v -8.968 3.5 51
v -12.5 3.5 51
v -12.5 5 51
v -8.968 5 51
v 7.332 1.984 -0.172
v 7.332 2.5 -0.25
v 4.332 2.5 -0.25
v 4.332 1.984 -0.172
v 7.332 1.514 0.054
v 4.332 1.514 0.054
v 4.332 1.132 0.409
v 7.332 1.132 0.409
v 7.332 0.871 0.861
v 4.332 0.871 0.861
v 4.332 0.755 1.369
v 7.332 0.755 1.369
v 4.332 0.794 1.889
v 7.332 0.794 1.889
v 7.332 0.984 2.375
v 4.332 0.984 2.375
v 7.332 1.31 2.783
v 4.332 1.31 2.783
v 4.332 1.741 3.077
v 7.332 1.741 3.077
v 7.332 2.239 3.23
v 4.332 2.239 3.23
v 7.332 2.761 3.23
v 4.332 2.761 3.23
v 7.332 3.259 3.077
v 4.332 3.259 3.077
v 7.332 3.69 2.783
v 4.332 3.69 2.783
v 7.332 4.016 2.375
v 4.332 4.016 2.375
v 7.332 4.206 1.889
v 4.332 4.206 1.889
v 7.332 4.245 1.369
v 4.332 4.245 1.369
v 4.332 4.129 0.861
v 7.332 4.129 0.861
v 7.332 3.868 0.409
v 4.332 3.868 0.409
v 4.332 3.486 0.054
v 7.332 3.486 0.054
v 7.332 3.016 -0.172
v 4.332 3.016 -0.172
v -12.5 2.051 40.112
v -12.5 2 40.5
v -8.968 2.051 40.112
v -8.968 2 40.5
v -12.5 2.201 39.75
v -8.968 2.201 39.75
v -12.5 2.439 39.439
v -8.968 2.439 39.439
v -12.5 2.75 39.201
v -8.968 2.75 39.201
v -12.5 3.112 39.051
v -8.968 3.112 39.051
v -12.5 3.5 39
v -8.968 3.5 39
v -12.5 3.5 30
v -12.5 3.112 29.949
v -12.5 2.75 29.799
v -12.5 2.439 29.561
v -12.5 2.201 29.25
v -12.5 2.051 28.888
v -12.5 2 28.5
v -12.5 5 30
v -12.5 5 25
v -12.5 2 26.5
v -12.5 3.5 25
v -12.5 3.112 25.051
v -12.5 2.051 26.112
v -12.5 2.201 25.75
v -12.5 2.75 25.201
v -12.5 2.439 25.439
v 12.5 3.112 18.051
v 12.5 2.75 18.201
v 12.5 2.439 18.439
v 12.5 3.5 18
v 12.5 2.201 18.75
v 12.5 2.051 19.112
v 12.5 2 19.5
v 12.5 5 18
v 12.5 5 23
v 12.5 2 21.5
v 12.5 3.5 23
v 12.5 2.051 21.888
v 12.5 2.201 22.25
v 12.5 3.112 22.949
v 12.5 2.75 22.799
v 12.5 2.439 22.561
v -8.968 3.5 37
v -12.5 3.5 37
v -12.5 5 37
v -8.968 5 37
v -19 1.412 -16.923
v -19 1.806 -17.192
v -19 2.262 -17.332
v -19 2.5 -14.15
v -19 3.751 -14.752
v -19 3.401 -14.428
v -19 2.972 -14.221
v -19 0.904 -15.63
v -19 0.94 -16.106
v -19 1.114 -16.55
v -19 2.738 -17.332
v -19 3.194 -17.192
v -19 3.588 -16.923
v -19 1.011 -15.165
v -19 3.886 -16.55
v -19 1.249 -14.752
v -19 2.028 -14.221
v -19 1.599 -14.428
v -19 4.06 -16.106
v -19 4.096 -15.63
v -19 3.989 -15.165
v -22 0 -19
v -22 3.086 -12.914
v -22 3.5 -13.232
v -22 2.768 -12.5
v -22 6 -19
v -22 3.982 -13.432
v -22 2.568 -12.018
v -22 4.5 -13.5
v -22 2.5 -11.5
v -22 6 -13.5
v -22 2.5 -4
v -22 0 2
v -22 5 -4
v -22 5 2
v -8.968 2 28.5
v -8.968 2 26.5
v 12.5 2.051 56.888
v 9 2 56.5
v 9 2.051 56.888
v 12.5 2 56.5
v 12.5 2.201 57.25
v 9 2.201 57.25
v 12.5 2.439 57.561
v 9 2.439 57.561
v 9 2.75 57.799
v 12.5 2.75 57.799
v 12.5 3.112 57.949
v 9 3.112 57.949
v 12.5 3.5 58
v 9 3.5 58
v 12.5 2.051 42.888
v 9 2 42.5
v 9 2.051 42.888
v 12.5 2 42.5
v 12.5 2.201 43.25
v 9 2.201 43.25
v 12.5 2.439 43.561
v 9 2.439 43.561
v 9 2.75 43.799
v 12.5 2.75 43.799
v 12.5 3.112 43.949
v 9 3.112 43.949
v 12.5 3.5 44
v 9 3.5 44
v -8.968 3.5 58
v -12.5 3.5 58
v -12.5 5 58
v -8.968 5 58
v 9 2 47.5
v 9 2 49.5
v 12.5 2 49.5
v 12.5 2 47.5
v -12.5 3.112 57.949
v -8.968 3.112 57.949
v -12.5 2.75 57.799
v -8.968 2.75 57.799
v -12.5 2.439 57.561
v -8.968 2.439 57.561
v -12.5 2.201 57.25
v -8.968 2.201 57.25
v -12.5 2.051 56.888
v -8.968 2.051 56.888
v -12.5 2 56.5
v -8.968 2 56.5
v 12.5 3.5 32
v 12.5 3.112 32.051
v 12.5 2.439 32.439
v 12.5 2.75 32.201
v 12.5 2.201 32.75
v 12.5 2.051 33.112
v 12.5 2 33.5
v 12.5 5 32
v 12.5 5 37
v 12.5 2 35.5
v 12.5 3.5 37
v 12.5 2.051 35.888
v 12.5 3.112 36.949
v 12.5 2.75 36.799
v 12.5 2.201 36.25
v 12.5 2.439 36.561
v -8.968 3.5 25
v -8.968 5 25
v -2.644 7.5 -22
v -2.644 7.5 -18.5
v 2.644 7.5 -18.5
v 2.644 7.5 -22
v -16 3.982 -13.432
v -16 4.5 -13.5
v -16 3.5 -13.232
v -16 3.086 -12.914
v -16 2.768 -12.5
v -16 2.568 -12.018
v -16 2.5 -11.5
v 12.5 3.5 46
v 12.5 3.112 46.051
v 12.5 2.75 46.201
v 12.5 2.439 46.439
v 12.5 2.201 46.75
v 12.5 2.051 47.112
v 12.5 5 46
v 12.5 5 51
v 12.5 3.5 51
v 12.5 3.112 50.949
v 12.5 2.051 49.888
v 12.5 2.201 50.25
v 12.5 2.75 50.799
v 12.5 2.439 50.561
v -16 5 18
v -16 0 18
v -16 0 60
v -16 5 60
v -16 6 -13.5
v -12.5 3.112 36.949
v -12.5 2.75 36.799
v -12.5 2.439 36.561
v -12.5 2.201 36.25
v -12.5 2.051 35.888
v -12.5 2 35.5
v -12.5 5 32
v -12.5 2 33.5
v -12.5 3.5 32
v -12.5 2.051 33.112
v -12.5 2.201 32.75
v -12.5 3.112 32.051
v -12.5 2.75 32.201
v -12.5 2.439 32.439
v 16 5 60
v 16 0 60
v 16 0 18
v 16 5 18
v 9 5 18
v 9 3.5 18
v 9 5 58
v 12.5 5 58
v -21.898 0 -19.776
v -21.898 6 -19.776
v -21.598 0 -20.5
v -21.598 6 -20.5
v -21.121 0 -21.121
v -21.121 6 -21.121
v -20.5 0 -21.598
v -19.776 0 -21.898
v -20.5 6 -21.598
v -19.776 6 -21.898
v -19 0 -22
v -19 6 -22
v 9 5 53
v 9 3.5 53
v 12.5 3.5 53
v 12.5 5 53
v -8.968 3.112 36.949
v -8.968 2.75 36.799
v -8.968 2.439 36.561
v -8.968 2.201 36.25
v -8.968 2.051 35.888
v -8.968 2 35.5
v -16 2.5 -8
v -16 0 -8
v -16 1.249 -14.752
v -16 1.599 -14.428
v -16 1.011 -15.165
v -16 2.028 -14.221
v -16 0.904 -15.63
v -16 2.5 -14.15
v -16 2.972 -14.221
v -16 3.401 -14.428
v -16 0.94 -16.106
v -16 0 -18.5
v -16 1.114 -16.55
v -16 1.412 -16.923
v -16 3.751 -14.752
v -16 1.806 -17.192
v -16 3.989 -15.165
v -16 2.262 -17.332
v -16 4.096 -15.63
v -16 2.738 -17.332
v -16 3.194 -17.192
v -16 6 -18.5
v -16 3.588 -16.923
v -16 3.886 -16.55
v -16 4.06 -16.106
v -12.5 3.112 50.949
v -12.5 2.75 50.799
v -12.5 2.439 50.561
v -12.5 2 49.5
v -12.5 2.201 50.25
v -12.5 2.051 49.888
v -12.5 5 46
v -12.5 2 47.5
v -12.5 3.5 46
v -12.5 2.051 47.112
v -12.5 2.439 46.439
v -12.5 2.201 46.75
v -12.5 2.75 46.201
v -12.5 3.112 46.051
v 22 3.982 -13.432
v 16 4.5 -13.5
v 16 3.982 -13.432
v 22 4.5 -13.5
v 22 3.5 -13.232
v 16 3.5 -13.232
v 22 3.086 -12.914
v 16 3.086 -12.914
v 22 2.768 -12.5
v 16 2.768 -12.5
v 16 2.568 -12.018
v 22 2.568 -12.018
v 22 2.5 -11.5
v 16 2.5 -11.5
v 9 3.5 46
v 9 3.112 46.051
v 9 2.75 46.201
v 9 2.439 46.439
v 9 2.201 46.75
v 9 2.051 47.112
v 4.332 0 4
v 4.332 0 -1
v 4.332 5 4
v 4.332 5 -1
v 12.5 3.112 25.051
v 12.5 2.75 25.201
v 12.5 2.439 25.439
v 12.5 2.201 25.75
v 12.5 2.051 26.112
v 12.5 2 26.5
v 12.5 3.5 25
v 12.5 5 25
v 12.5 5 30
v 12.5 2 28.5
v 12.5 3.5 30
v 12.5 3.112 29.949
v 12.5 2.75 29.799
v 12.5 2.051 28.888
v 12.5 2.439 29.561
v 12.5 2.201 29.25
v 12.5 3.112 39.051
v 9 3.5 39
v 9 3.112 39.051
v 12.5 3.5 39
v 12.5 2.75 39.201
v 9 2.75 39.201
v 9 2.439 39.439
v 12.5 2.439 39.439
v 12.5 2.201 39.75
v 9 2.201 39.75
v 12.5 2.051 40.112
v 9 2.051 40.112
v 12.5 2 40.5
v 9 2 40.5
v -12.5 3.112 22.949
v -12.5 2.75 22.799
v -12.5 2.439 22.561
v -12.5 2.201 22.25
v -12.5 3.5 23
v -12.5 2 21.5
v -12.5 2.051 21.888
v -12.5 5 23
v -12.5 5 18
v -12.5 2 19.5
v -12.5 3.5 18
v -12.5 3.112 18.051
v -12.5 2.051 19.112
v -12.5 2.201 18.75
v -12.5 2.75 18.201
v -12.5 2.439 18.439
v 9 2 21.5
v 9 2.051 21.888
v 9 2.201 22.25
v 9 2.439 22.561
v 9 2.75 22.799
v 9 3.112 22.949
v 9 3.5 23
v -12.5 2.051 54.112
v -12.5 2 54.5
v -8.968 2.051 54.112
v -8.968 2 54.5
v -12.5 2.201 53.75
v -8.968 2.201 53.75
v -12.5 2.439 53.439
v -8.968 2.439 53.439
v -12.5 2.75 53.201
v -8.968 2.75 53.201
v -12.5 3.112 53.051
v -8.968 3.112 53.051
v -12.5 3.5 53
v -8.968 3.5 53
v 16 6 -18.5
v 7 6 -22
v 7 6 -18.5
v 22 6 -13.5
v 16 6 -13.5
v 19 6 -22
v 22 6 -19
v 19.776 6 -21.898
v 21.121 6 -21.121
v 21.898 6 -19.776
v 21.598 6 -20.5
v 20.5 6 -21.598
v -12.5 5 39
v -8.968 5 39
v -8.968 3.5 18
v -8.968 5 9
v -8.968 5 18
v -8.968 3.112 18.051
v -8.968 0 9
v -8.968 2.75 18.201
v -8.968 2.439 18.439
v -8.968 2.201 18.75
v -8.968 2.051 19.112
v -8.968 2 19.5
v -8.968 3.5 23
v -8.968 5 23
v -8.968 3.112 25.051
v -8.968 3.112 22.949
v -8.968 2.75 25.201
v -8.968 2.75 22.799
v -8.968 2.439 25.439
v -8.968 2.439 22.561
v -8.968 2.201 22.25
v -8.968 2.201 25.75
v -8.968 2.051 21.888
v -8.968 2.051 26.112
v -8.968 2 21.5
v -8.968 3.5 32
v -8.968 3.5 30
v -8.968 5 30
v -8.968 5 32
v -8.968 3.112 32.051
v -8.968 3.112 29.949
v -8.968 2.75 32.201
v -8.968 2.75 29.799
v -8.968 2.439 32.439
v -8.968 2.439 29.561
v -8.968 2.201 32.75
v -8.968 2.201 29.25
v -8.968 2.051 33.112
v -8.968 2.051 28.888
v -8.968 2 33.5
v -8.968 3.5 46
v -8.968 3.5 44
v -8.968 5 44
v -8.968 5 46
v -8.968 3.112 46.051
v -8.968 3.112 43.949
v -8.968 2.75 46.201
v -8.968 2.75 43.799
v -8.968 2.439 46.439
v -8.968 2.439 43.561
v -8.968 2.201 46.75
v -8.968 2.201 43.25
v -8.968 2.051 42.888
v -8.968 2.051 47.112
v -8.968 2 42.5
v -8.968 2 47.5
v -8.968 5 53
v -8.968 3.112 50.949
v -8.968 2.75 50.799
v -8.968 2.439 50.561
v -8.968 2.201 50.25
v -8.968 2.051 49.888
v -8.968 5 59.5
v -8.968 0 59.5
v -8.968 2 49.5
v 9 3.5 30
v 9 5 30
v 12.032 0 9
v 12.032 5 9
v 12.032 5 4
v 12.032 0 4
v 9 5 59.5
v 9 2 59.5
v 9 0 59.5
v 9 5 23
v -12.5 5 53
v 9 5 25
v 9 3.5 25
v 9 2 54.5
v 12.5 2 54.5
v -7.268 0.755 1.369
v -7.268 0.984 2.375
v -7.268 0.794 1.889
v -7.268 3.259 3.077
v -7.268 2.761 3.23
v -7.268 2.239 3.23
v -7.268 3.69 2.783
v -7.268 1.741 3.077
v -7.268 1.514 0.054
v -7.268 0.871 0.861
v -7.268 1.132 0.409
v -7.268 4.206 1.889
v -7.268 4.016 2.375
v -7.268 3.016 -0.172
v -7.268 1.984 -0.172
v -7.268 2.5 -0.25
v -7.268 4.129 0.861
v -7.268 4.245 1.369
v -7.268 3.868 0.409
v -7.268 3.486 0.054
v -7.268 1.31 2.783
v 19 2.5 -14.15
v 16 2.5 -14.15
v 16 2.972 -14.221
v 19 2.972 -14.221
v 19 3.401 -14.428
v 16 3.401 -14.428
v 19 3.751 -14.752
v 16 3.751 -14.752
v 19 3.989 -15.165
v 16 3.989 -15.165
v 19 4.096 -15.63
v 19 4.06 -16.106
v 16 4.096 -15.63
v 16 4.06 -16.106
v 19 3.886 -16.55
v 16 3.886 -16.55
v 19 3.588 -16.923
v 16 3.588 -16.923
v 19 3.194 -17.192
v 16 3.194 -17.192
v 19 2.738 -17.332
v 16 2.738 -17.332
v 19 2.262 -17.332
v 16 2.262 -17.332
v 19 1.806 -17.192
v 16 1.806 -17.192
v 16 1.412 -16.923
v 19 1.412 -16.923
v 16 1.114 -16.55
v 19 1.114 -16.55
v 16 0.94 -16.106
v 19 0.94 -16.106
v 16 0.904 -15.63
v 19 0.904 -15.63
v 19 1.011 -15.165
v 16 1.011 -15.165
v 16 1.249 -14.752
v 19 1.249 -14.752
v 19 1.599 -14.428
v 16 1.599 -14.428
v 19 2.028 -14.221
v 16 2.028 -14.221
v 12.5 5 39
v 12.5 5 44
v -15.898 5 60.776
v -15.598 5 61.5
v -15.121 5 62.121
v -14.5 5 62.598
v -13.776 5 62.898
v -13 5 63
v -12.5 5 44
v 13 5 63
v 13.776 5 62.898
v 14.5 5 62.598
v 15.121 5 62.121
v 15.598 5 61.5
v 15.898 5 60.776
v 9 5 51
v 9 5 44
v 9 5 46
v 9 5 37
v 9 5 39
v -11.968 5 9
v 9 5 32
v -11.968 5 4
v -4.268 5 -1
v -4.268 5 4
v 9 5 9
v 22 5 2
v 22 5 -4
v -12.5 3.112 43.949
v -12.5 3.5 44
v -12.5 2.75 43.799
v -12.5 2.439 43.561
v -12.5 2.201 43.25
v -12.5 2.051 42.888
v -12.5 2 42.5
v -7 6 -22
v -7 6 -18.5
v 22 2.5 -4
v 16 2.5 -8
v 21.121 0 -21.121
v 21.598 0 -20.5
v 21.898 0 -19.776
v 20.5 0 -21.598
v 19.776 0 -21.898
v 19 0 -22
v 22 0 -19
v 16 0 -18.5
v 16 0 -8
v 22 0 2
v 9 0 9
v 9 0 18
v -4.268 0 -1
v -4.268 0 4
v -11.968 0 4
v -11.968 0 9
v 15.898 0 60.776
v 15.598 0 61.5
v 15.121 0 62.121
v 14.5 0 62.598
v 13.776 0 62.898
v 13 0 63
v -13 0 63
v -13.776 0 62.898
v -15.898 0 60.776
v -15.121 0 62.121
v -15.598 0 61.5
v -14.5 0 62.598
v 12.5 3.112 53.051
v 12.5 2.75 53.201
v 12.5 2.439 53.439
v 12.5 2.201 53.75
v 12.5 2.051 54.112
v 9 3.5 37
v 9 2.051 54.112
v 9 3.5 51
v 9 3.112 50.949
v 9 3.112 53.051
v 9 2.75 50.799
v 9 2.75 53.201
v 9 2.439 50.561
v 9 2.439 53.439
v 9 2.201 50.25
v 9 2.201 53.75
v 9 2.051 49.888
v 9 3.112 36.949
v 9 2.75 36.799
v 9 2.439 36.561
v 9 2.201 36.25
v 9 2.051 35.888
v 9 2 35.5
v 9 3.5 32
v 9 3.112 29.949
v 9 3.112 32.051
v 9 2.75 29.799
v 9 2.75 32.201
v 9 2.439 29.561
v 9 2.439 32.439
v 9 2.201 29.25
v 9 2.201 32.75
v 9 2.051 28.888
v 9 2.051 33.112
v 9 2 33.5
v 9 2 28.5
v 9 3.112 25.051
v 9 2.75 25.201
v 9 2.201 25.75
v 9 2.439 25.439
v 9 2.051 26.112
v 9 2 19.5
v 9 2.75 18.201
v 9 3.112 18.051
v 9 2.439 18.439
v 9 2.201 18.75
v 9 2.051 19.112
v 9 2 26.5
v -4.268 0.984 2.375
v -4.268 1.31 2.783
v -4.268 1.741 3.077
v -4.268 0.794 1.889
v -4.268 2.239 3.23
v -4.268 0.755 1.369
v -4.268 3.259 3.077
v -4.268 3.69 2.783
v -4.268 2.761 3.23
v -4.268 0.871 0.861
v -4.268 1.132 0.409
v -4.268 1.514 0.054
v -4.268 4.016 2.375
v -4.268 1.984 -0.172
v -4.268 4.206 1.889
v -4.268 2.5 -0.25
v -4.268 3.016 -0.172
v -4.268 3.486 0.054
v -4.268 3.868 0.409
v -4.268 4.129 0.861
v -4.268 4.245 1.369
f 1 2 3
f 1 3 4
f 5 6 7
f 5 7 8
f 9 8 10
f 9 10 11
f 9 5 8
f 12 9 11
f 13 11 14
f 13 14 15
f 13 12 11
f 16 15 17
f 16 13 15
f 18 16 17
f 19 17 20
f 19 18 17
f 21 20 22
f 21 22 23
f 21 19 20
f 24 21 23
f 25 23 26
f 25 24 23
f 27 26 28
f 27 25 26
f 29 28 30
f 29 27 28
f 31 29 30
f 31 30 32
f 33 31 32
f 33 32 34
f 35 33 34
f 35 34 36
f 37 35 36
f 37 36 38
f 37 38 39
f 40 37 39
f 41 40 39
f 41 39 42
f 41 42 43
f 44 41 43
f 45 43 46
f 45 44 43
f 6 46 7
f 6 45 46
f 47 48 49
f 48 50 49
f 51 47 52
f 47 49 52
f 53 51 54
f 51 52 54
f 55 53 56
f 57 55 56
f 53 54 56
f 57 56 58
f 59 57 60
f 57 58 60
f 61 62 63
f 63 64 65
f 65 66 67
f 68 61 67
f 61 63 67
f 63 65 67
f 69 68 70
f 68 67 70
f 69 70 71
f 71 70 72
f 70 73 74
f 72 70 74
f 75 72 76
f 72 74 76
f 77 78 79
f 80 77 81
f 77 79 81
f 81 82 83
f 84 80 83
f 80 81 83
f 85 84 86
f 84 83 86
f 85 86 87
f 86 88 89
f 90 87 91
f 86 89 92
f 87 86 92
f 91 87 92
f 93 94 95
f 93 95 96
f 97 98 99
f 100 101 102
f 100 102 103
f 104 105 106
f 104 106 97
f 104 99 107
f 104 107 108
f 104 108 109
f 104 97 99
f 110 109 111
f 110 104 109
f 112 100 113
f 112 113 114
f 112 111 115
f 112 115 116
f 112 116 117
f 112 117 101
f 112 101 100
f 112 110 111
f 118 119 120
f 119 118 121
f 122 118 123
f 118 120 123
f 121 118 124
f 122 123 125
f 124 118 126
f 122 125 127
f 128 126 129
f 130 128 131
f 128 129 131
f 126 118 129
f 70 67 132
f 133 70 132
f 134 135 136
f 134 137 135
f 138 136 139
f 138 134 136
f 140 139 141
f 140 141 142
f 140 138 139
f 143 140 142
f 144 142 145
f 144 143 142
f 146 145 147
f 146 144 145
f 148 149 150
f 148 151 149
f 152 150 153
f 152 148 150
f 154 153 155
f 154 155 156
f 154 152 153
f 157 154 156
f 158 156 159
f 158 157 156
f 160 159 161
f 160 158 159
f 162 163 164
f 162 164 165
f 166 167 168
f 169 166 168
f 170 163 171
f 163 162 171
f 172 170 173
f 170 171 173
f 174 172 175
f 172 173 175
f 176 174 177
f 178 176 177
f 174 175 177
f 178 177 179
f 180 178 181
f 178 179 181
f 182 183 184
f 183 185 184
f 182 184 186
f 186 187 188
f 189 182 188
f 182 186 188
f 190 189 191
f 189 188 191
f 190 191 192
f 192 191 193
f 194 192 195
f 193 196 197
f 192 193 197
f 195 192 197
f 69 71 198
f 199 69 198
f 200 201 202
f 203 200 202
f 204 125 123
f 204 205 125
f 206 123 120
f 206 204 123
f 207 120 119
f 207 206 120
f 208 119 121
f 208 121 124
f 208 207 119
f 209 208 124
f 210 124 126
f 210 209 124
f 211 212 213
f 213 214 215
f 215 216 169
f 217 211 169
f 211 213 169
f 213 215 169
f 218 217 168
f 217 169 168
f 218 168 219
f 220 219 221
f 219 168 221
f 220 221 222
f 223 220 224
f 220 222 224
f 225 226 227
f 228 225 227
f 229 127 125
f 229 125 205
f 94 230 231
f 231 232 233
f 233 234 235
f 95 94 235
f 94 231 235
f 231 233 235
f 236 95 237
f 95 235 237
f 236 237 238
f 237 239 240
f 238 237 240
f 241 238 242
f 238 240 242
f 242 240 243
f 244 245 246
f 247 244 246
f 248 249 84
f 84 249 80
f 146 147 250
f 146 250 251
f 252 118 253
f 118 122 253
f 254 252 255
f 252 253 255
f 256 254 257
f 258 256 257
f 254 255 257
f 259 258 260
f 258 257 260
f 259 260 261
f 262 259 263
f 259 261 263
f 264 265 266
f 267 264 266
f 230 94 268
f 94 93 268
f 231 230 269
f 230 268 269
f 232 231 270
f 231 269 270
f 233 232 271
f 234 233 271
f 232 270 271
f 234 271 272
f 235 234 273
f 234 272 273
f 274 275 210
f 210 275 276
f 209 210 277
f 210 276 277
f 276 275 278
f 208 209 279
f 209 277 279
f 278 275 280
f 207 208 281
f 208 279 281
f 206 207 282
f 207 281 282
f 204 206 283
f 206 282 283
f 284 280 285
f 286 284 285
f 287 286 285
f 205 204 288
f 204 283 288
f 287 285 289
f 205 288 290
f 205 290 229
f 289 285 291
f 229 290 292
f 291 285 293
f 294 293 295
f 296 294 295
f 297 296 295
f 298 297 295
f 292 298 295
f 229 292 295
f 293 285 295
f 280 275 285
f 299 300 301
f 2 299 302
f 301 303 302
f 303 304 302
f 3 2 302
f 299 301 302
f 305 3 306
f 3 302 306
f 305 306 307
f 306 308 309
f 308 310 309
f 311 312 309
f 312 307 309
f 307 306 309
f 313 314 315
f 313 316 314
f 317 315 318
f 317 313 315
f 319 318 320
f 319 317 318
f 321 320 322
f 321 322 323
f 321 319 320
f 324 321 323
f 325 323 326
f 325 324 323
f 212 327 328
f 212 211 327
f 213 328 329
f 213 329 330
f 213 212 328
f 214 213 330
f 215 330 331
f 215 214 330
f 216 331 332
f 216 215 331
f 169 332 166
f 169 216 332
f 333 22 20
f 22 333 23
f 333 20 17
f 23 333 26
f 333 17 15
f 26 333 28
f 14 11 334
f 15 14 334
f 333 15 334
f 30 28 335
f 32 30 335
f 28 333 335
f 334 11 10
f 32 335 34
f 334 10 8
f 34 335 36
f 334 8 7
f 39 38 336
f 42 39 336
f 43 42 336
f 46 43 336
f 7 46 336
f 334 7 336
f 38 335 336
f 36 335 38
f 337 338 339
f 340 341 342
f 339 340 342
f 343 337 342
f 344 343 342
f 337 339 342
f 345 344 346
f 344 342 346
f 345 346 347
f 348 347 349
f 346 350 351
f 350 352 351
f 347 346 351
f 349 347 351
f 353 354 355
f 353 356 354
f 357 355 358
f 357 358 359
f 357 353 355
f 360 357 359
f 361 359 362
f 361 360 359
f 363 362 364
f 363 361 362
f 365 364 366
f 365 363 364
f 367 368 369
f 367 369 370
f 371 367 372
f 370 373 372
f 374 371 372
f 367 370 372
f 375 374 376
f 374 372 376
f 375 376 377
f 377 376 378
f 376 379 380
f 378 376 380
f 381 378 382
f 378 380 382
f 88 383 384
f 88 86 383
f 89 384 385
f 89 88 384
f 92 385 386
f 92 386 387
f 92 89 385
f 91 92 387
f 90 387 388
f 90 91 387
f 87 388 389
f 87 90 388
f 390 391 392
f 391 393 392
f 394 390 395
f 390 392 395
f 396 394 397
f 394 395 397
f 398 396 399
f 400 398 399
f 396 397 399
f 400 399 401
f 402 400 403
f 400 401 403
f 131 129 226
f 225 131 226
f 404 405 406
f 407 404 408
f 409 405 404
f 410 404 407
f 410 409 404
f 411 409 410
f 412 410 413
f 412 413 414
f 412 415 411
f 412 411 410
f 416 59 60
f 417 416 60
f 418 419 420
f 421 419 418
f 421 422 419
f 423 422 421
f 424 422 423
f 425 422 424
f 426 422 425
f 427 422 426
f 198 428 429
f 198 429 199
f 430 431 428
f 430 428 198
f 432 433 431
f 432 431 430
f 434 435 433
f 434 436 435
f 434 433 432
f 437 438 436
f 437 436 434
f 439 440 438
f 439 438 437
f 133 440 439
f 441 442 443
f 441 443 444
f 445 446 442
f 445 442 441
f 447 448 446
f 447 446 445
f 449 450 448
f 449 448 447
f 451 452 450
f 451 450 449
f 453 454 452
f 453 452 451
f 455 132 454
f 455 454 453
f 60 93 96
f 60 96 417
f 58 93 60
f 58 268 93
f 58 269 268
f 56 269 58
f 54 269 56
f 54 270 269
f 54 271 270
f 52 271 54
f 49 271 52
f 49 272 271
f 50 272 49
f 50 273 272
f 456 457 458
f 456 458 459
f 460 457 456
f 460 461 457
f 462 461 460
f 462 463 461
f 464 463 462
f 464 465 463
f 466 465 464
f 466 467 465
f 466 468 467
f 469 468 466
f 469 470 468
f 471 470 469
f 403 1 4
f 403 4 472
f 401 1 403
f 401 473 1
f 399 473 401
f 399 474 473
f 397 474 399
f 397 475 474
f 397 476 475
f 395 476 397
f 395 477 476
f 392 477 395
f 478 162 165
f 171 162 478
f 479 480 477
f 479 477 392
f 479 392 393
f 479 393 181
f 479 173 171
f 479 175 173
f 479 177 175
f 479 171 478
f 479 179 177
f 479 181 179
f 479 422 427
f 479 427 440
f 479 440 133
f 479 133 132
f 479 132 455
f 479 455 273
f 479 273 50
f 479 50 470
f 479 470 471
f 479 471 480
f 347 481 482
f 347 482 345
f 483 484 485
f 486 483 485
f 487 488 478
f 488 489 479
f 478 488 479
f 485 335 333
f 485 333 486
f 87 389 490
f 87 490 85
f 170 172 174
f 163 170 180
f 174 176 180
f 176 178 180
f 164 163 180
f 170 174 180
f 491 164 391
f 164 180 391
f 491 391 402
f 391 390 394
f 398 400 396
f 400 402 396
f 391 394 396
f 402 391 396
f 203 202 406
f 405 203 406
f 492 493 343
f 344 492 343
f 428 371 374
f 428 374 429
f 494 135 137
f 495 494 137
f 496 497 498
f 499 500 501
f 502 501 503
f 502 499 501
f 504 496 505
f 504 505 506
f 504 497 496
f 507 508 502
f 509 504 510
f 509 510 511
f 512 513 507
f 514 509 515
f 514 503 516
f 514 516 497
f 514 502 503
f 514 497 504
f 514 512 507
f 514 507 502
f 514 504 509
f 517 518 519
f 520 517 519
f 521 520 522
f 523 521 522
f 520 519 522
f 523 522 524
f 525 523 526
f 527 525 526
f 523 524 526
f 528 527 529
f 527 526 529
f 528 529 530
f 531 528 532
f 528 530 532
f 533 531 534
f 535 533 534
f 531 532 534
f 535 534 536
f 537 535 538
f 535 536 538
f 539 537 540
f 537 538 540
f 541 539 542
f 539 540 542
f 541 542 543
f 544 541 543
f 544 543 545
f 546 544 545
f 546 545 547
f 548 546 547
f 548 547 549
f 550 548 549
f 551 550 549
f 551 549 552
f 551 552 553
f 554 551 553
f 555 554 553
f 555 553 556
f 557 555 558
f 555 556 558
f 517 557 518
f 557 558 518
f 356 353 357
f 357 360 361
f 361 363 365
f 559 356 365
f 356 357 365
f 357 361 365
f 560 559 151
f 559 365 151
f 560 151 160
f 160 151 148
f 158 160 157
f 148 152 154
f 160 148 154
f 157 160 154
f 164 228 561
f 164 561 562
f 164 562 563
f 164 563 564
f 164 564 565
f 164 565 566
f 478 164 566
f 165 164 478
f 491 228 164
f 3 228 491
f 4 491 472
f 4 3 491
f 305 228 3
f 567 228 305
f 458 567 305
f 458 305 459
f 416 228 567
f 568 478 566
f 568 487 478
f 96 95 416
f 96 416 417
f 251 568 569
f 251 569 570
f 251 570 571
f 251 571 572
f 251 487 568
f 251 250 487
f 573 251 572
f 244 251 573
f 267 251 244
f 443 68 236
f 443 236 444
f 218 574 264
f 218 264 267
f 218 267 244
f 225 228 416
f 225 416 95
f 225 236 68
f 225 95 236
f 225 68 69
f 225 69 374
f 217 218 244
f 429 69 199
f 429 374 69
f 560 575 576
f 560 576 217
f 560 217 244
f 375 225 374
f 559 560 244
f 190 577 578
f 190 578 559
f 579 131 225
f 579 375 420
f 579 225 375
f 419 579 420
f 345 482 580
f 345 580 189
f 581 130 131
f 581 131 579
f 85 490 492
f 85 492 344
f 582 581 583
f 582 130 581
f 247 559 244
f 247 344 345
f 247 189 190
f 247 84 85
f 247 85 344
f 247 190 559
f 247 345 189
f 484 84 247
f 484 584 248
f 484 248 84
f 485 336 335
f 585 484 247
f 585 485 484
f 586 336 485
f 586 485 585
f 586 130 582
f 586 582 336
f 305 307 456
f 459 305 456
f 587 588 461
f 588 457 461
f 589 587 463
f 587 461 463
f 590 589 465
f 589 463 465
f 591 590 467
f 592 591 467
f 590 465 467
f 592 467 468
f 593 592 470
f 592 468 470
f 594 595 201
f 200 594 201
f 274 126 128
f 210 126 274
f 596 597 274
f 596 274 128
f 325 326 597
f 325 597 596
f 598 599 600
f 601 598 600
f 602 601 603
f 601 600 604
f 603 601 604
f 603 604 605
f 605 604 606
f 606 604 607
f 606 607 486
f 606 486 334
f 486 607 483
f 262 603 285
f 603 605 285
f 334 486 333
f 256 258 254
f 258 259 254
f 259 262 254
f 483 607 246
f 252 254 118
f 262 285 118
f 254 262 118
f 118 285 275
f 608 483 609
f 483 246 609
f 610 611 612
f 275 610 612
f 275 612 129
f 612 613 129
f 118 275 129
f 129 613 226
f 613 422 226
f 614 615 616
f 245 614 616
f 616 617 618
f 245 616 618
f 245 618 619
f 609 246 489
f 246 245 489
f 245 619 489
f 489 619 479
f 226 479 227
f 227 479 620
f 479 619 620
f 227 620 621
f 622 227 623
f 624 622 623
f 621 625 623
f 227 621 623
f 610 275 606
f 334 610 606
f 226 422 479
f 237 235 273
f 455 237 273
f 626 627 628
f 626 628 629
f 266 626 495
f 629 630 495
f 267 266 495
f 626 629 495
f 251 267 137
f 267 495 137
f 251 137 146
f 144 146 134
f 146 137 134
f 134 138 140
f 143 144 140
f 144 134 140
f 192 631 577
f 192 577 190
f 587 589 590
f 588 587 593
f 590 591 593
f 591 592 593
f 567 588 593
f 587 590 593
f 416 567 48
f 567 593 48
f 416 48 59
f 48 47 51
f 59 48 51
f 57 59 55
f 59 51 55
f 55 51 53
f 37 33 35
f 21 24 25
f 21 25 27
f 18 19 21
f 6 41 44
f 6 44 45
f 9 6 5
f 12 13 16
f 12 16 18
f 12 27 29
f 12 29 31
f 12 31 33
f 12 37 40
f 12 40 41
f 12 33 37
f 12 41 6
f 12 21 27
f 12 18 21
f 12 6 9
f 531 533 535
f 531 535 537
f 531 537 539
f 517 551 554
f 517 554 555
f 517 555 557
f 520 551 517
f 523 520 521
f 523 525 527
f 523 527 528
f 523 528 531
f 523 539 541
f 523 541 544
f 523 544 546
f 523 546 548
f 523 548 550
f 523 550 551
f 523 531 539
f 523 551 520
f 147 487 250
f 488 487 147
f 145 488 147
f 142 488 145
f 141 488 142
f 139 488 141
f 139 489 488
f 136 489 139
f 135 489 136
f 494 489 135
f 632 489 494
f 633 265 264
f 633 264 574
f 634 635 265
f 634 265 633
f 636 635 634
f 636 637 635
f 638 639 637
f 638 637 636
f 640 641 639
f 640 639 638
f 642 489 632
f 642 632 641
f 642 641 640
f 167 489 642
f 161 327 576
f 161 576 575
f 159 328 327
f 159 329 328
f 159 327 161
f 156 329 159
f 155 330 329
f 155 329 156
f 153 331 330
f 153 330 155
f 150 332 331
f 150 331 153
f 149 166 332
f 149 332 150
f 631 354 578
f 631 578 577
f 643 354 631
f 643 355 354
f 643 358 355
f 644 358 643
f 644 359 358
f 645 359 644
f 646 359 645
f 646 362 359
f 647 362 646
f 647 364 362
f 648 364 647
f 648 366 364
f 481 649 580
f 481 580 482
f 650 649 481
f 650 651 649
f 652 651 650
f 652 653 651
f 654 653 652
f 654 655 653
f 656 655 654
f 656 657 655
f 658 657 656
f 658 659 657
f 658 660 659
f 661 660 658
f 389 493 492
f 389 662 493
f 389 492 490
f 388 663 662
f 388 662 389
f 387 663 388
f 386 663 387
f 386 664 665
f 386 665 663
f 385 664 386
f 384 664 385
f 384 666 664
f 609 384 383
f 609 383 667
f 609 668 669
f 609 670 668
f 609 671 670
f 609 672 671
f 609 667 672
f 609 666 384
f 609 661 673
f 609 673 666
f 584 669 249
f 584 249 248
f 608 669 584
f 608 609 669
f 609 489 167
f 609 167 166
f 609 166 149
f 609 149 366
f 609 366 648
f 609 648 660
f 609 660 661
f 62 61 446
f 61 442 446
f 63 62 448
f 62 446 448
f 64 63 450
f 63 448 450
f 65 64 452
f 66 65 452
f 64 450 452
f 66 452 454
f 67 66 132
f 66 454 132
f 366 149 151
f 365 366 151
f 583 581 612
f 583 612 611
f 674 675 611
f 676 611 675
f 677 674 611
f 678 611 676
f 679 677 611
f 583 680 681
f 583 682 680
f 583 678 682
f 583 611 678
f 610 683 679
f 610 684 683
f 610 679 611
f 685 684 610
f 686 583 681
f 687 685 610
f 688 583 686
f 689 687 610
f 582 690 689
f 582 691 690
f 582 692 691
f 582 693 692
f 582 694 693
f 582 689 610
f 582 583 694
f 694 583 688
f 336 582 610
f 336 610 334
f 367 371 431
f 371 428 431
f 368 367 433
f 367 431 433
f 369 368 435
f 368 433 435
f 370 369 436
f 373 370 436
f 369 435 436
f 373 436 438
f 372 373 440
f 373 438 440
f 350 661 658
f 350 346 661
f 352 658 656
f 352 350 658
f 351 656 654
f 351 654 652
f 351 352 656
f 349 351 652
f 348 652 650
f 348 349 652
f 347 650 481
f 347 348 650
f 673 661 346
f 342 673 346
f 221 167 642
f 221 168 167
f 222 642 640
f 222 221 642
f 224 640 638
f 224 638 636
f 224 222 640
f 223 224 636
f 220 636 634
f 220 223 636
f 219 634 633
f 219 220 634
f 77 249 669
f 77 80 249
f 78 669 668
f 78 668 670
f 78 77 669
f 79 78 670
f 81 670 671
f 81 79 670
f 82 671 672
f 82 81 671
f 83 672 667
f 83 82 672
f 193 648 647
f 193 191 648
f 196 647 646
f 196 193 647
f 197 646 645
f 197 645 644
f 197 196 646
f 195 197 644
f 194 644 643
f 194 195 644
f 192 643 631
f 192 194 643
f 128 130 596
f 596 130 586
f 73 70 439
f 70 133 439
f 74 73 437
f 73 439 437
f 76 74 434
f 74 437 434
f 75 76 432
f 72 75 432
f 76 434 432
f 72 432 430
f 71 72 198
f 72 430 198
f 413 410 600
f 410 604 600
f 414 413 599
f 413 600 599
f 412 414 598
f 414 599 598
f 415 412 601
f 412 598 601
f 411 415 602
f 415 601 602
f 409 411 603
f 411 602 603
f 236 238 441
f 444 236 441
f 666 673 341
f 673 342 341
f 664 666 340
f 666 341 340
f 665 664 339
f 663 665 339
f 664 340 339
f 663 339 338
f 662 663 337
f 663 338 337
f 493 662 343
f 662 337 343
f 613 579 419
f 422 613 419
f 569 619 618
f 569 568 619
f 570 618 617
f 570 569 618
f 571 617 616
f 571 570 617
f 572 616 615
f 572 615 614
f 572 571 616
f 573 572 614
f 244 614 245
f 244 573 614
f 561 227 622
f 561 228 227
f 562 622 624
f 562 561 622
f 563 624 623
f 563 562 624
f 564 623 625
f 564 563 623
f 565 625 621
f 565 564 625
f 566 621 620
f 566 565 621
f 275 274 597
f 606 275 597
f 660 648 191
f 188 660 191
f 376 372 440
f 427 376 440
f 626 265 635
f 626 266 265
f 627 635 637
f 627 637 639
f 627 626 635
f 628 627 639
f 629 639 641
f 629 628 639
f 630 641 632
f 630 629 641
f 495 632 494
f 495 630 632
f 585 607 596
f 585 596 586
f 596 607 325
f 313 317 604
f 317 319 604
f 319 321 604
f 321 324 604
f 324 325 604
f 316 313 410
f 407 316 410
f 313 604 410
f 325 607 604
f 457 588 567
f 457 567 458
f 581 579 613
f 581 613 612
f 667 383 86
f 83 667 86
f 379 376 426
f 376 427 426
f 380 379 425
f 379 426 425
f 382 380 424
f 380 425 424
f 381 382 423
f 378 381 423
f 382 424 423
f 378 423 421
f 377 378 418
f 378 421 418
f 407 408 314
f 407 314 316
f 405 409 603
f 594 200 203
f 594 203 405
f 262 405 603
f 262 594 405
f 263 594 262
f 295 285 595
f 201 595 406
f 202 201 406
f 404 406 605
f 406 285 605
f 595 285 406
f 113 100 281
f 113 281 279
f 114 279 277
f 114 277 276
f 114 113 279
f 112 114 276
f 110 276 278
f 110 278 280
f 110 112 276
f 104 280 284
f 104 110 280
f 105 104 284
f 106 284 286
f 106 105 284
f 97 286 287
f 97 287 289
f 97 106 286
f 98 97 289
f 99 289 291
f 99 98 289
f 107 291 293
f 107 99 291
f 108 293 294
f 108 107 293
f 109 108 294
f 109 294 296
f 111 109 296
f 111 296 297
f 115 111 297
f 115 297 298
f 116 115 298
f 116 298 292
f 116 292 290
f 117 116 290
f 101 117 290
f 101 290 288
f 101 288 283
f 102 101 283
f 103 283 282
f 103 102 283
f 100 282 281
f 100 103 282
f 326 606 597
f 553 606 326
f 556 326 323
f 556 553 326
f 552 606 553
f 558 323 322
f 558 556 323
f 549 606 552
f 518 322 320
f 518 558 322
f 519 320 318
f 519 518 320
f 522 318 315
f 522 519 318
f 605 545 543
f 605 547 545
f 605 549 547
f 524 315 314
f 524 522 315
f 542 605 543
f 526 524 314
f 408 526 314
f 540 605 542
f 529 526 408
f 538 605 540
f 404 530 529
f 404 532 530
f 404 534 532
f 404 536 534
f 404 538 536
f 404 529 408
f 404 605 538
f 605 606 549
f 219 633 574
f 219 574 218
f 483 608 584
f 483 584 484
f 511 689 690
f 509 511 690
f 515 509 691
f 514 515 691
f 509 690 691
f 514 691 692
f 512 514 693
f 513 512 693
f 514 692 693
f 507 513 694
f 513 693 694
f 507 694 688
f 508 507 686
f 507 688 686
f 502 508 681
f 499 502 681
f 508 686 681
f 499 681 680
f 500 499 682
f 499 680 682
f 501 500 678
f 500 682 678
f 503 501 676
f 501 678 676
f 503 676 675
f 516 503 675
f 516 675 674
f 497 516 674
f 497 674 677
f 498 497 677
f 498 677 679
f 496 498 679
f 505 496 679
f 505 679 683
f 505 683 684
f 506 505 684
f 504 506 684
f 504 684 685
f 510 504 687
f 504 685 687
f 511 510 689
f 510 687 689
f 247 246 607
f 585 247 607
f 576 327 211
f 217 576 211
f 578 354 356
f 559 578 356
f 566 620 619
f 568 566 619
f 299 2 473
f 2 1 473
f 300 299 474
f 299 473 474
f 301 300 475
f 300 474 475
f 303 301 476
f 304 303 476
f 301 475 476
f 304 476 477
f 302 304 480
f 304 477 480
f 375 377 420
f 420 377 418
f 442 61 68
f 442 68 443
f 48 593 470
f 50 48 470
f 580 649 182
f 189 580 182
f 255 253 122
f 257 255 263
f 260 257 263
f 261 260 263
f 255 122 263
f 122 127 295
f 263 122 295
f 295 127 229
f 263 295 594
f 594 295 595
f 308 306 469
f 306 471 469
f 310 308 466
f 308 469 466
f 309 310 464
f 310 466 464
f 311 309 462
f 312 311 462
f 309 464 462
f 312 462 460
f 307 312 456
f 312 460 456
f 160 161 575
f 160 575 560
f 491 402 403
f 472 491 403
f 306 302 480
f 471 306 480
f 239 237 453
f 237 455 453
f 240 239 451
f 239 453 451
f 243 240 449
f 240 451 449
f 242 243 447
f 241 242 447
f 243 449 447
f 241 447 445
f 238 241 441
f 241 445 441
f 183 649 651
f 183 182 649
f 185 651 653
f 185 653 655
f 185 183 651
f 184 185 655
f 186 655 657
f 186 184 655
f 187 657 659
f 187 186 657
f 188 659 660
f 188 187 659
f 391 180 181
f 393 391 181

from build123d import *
from OCP.BRepFilletAPI import BRepFilletAPI_MakeChamfer

# Parameters (mm, degrees)
SKETCH1_W                = 44
SKETCH1_H                = 22
BOSS_EXTRUDE1_DEPTH      = 5
SKETCH2_W                = 3.531949687
SKETCH2_H                = 41.5
SKETCH2_W_2              = 3.5
BOSS_EXTRUDE2_DEPTH      = 2
SKETCH3_W                = 44
SKETCH3_H                = 9.5
CUT_EXTRUDE1_DEPTH       = 2.5
SKETCH4_W                = 17.968050313
SKETCH4_H                = 14
CUT_EXTRUDE2_DEPTH       = 5
SKETCH5_W                = 24
SKETCH5_H                = 5
CUT_EXTRUDE3_DEPTH       = 5
SKETCH6_W                = 8.6
SKETCH6_H                = 5
CUT_EXTRUDE4_DEPTH       = 5
SKETCH7_W                = 14
SKETCH7_H                = 2
BOSS_EXTRUDE3_DEPTH      = 1.5
CHAMFER1_SIZE            = 1.5
CHAMFER1_SIZE_2          = 4.356316317
SKETCH8_W                = 32
SKETCH8_H                = 10
CUT_EXTRUDE5_DEPTH       = 5
FILLET3_R                = 3
SKETCH9_R                = 1.75
CUT_EXTRUDE6_DEPTH       = 3
CUT_EXTRUDE7_START       = -3
SKETCH10_R               = 1.75
CUT_EXTRUDE7_DEPTH       = 3
SKETCH11_R               = 1.6
CUT_EXTRUDE8_DEPTH       = 3
CUT_EXTRUDE9_START       = -3
SKETCH12_R               = 1.6
CUT_EXTRUDE9_DEPTH       = 3
SKETCH13_W               = 3.531949687
SKETCH13_H               = 2
BOSS_EXTRUDE5_DEPTH      = 3
FILLET4_R                = 1.5
BOSS_EXTRUDE6_DEPTH      = 2
BOSS_EXTRUDE6_DEPTH_BACK = 2
SKETCH15_W               = 6
SKETCH15_H               = 1
BOSS_EXTRUDE7_DEPTH      = 4.5
FILLET5_R                = 2
FILLET6_R                = 3
CUT_EXTRUDE10_DEPTH      = 14.5
CUT_EXTRUDE10_DEPTH_BACK = 14.5
SKETCH16_W               = 32
SKETCH16_H               = 0.5


with BuildPart() as part:
    # Sketch1 → Boss-Extrude1 (new body)
    with BuildSketch(Plane(origin=(0, 0, 0), x_dir=(1, 0, 0), z_dir=(0, 1, 0))):
        with Locations((0, 9)):
            Rectangle(SKETCH1_W, SKETCH1_H)
        Polygon((-16, -18), (16, -18), (22, -2), (-22, -2), align=None)
        Polygon((-12.5, -18), (-16, -18), (-16, -63), (16, -63), (16, -18), (12.5, -18), (12.5, -59.5), (-12.5, -59.5), align=None)
    extrude(amount=BOSS_EXTRUDE1_DEPTH)

    # Sketch2 → Boss-Extrude2 (add)
    with BuildSketch(Plane.XZ):
        with Locations((-10.734025156, 38.75)):
            Rectangle(SKETCH2_W, SKETCH2_H)
        with Locations((10.75, 38.75)):
            Rectangle(SKETCH2_W_2, SKETCH2_H)
    extrude(amount=-BOSS_EXTRUDE2_DEPTH)

    # Sketch3 → Cut-Extrude1 (cut)
    with BuildSketch(Plane(origin=(0, 5, 0), x_dir=(1, 0, 0), z_dir=(0, 1, 0))):
        with Locations((0, 8.75)):
            Rectangle(SKETCH3_W, SKETCH3_H)
    extrude(amount=-CUT_EXTRUDE1_DEPTH, mode=Mode.SUBTRACT)

    # Sketch4 → Cut-Extrude2 (cut)
    with BuildSketch(Plane(origin=(0, 5, 0), x_dir=(1, 0, 0), z_dir=(0, 1, 0))):
        with Locations((0.015974843, -11)):
            Rectangle(SKETCH4_W, SKETCH4_H)
    extrude(amount=-CUT_EXTRUDE2_DEPTH, mode=Mode.SUBTRACT)

    # Sketch5 → Cut-Extrude3 (cut)
    with BuildSketch(Plane(origin=(0, 5, 0), x_dir=(1, 0, 0), z_dir=(0, 1, 0))):
        with Locations((0.031949687, -6.5)):
            Rectangle(SKETCH5_W, SKETCH5_H)
    extrude(amount=-CUT_EXTRUDE3_DEPTH, mode=Mode.SUBTRACT)

    # Sketch6 → Cut-Extrude4 (cut)
    with BuildSketch(Plane(origin=(0, 5, 0), x_dir=(1, 0, 0), z_dir=(0, 1, 0))):
        with Locations((0.031949687, -1.5)):
            Rectangle(SKETCH6_W, SKETCH6_H)
    extrude(amount=-CUT_EXTRUDE4_DEPTH, mode=Mode.SUBTRACT)

    # Sketch7 → Boss-Extrude3 (add)
    with BuildSketch(Plane(origin=(0, 5, 0), x_dir=(1, 0, 0), z_dir=(0, 1, 0))):
        with Locations((0, 19)):
            Rectangle(SKETCH7_W, SKETCH7_H)
    extrude(amount=BOSS_EXTRUDE3_DEPTH)

    # Chamfer1
    chamfer1_edges_1 = [part.edges().sort_by_distance(p)[0] for p in [
        (7, 6.5, -19),
    ]]
    chamfer1_side_1 = [part.faces().sort_by_distance(p)[0] for p in [
        (7, 6.47, -19),
    ]]
    chamfer1_edges_2 = [part.edges().sort_by_distance(p)[0] for p in [
        (-7, 6.5, -19),
    ]]
    chamfer1_side_2 = [part.faces().sort_by_distance(p)[0] for p in [
        (-7, 6.47, -19),
    ]]
    chamfer1 = BRepFilletAPI_MakeChamfer(part.part.solid().wrapped)
    for e in chamfer1_edges_1:
        chamfer1.Add(CHAMFER1_SIZE - 0.0001, CHAMFER1_SIZE_2 - 0.0001, e.wrapped, chamfer1_side_1[0].wrapped)
    for e in chamfer1_edges_2:
        chamfer1.Add(CHAMFER1_SIZE - 0.0001, CHAMFER1_SIZE_2 - 0.0001, e.wrapped, chamfer1_side_2[0].wrapped)
    add(Compound.cast(chamfer1.Shape()), mode=Mode.REPLACE)  # a hair under: the kernel refuses the full size

    # Sketch8 → Cut-Extrude5 (cut)
    with BuildSketch(Plane(origin=(0, 5, 0), x_dir=(1, 0, 0), z_dir=(0, 1, 0))):
        with Locations((0, 13)):
            Rectangle(SKETCH8_W, SKETCH8_H)
    extrude(amount=-CUT_EXTRUDE5_DEPTH, mode=Mode.SUBTRACT)

    # Fillet3
    fillet3_edges = [part.edges().sort_by_distance(p)[0] for p in [
        (16, 2.5, 63),
        (-16, 2.5, 63),
    ]]
    fillet(fillet3_edges, radius=FILLET3_R)

    # Sketch9 → Cut-Extrude6 (cut)
    with BuildSketch(Plane(origin=(-4.268050313, 0, 0), x_dir=(0, 0, -1), z_dir=(1, 0, 0))):
        with Locations((-1.5, 2.5)):
            Circle(SKETCH9_R)
    extrude(amount=-CUT_EXTRUDE6_DEPTH, mode=Mode.SUBTRACT)

    # Sketch10 → Cut-Extrude7 (cut)
    with BuildSketch(Plane.ZY.offset(-4.331949687).offset(CUT_EXTRUDE7_START)):
        with Locations(Location((1.5, 2.5, 0), (0, 0, 180))):
            Circle(SKETCH10_R)
    extrude(amount=CUT_EXTRUDE7_DEPTH, mode=Mode.SUBTRACT)

    # Sketch11 → Cut-Extrude8 (cut)
    with BuildSketch(Plane.ZY.offset(-16)):
        with Locations((-15.75, 2.5)):
            Circle(SKETCH11_R)
    extrude(amount=-CUT_EXTRUDE8_DEPTH, mode=Mode.SUBTRACT)

    # Sketch12 → Cut-Extrude9 (cut)
    with BuildSketch(Plane(origin=(-16, 0, 0), x_dir=(0, 0, -1), z_dir=(1, 0, 0)).offset(CUT_EXTRUDE9_START)):
        with Locations(Location((15.75, 2.5, 0), (0, 0, 180))):
            Circle(SKETCH12_R)
    extrude(amount=CUT_EXTRUDE9_DEPTH, mode=Mode.SUBTRACT)

    # Sketch13 → Boss-Extrude5 (add)
    with BuildSketch(Plane(origin=(0, 2, 0), x_dir=(1, 0, 0), z_dir=(0, 1, 0))):
        with Locations((-10.734025156, -24)):
            Rectangle(SKETCH13_W, SKETCH13_H)
        with Locations((10.765974844, -24)):
            Rectangle(SKETCH13_W, SKETCH13_H)
        with Locations((10.765974844, -31)):
            Rectangle(SKETCH13_W, SKETCH13_H)
        with Locations((10.765974844, -38)):
            Rectangle(SKETCH13_W, SKETCH13_H)
        with Locations((10.765974844, -45)):
            Rectangle(SKETCH13_W, SKETCH13_H)
        with Locations((10.765974844, -52)):
            Rectangle(SKETCH13_W, SKETCH13_H)
        with Locations((10.765974844, -59)):
            Rectangle(SKETCH13_W, SKETCH13_H)
        with Locations((-10.734025156, -31)):
            Rectangle(SKETCH13_W, SKETCH13_H)
        with Locations((-10.734025156, -38)):
            Rectangle(SKETCH13_W, SKETCH13_H)
        with Locations((-10.734025156, -45)):
            Rectangle(SKETCH13_W, SKETCH13_H)
        with Locations((-10.734025156, -52)):
            Rectangle(SKETCH13_W, SKETCH13_H)
        with Locations((-10.734025156, -59)):
            Rectangle(SKETCH13_W, SKETCH13_H)
    extrude(amount=BOSS_EXTRUDE5_DEPTH)

    # Fillet4
    fillet4_edges = [part.edges().sort_by_distance(p)[0] for p in [
        (-10.734025157, 2, 23),
        (-10.734025157, 2, 25),
        (10.75, 2, 23),
        (10.75, 2, 25),
        (10.75, 2, 30),
        (10.75, 2, 32),
        (10.75, 2, 37),
        (10.75, 2, 39),
        (10.75, 2, 44),
        (10.75, 2, 46),
        (10.75, 2, 51),
        (10.75, 2, 53),
        (10.75, 2, 58),
        (-10.734025157, 2, 30),
        (-10.734025157, 2, 32),
        (-10.734025157, 2, 37),
        (-10.734025157, 2, 39),
        (-10.734025157, 2, 44),
        (-10.734025157, 2, 46),
        (-10.734025157, 2, 51),
        (-10.734025157, 2, 53),
        (-10.734025157, 2, 58),
        (-10.734025157, 2, 18),
        (10.75, 2, 18),
    ]]
    fillet(fillet4_edges, radius=FILLET4_R)

    # Sketch14 → Boss-Extrude6 (add, two sides: drawn at the far end of the back side and taken through both)
    with BuildSketch(Plane(origin=(0, 0, -20), x_dir=(-1, 0, 0), z_dir=(0, 0, -1)).offset(-BOSS_EXTRUDE6_DEPTH_BACK)):
        Polygon((-22, 6), (-22, 0), (22, 0), (22, 6), (7, 6), (2.643683683, 7.5), (-2.643683683, 7.5), (-7, 6), align=None)
    extrude(amount=BOSS_EXTRUDE6_DEPTH + BOSS_EXTRUDE6_DEPTH_BACK)

    # Sketch15 → Boss-Extrude7 (add)
    with BuildSketch(Plane.XY.offset(-18)):
        with Locations((19, 5.5)):
            Rectangle(SKETCH15_W, SKETCH15_H)
        with Locations((-19, 5.5)):
            Rectangle(SKETCH15_W, SKETCH15_H)
    extrude(amount=BOSS_EXTRUDE7_DEPTH)

    # Fillet5
    fillet5_edges = [part.edges().sort_by_distance(p)[0] for p in [
        (-19, 2.5, -13.5),
        (19, 2.5, -13.5),
    ]]
    fillet(fillet5_edges, radius=FILLET5_R)

    # Fillet6
    fillet6_edges = [part.edges().sort_by_distance(p)[0] for p in [
        (22, 3, -22),
        (-22, 3, -22),
    ]]
    fillet(fillet6_edges, radius=FILLET6_R)

    # Sketch16 → Cut-Extrude10 (cut, two sides: drawn at the far end of the back side and taken through both)
    with BuildSketch(Plane(origin=(0, 6, 0), x_dir=(1, 0, 0), z_dir=(0, 1, 0)).offset(-CUT_EXTRUDE10_DEPTH_BACK)):
        with Locations((0, 18.25)):
            Rectangle(SKETCH16_W, SKETCH16_H)
    extrude(amount=CUT_EXTRUDE10_DEPTH + CUT_EXTRUDE10_DEPTH_BACK, mode=Mode.SUBTRACT)


solid = part.part
